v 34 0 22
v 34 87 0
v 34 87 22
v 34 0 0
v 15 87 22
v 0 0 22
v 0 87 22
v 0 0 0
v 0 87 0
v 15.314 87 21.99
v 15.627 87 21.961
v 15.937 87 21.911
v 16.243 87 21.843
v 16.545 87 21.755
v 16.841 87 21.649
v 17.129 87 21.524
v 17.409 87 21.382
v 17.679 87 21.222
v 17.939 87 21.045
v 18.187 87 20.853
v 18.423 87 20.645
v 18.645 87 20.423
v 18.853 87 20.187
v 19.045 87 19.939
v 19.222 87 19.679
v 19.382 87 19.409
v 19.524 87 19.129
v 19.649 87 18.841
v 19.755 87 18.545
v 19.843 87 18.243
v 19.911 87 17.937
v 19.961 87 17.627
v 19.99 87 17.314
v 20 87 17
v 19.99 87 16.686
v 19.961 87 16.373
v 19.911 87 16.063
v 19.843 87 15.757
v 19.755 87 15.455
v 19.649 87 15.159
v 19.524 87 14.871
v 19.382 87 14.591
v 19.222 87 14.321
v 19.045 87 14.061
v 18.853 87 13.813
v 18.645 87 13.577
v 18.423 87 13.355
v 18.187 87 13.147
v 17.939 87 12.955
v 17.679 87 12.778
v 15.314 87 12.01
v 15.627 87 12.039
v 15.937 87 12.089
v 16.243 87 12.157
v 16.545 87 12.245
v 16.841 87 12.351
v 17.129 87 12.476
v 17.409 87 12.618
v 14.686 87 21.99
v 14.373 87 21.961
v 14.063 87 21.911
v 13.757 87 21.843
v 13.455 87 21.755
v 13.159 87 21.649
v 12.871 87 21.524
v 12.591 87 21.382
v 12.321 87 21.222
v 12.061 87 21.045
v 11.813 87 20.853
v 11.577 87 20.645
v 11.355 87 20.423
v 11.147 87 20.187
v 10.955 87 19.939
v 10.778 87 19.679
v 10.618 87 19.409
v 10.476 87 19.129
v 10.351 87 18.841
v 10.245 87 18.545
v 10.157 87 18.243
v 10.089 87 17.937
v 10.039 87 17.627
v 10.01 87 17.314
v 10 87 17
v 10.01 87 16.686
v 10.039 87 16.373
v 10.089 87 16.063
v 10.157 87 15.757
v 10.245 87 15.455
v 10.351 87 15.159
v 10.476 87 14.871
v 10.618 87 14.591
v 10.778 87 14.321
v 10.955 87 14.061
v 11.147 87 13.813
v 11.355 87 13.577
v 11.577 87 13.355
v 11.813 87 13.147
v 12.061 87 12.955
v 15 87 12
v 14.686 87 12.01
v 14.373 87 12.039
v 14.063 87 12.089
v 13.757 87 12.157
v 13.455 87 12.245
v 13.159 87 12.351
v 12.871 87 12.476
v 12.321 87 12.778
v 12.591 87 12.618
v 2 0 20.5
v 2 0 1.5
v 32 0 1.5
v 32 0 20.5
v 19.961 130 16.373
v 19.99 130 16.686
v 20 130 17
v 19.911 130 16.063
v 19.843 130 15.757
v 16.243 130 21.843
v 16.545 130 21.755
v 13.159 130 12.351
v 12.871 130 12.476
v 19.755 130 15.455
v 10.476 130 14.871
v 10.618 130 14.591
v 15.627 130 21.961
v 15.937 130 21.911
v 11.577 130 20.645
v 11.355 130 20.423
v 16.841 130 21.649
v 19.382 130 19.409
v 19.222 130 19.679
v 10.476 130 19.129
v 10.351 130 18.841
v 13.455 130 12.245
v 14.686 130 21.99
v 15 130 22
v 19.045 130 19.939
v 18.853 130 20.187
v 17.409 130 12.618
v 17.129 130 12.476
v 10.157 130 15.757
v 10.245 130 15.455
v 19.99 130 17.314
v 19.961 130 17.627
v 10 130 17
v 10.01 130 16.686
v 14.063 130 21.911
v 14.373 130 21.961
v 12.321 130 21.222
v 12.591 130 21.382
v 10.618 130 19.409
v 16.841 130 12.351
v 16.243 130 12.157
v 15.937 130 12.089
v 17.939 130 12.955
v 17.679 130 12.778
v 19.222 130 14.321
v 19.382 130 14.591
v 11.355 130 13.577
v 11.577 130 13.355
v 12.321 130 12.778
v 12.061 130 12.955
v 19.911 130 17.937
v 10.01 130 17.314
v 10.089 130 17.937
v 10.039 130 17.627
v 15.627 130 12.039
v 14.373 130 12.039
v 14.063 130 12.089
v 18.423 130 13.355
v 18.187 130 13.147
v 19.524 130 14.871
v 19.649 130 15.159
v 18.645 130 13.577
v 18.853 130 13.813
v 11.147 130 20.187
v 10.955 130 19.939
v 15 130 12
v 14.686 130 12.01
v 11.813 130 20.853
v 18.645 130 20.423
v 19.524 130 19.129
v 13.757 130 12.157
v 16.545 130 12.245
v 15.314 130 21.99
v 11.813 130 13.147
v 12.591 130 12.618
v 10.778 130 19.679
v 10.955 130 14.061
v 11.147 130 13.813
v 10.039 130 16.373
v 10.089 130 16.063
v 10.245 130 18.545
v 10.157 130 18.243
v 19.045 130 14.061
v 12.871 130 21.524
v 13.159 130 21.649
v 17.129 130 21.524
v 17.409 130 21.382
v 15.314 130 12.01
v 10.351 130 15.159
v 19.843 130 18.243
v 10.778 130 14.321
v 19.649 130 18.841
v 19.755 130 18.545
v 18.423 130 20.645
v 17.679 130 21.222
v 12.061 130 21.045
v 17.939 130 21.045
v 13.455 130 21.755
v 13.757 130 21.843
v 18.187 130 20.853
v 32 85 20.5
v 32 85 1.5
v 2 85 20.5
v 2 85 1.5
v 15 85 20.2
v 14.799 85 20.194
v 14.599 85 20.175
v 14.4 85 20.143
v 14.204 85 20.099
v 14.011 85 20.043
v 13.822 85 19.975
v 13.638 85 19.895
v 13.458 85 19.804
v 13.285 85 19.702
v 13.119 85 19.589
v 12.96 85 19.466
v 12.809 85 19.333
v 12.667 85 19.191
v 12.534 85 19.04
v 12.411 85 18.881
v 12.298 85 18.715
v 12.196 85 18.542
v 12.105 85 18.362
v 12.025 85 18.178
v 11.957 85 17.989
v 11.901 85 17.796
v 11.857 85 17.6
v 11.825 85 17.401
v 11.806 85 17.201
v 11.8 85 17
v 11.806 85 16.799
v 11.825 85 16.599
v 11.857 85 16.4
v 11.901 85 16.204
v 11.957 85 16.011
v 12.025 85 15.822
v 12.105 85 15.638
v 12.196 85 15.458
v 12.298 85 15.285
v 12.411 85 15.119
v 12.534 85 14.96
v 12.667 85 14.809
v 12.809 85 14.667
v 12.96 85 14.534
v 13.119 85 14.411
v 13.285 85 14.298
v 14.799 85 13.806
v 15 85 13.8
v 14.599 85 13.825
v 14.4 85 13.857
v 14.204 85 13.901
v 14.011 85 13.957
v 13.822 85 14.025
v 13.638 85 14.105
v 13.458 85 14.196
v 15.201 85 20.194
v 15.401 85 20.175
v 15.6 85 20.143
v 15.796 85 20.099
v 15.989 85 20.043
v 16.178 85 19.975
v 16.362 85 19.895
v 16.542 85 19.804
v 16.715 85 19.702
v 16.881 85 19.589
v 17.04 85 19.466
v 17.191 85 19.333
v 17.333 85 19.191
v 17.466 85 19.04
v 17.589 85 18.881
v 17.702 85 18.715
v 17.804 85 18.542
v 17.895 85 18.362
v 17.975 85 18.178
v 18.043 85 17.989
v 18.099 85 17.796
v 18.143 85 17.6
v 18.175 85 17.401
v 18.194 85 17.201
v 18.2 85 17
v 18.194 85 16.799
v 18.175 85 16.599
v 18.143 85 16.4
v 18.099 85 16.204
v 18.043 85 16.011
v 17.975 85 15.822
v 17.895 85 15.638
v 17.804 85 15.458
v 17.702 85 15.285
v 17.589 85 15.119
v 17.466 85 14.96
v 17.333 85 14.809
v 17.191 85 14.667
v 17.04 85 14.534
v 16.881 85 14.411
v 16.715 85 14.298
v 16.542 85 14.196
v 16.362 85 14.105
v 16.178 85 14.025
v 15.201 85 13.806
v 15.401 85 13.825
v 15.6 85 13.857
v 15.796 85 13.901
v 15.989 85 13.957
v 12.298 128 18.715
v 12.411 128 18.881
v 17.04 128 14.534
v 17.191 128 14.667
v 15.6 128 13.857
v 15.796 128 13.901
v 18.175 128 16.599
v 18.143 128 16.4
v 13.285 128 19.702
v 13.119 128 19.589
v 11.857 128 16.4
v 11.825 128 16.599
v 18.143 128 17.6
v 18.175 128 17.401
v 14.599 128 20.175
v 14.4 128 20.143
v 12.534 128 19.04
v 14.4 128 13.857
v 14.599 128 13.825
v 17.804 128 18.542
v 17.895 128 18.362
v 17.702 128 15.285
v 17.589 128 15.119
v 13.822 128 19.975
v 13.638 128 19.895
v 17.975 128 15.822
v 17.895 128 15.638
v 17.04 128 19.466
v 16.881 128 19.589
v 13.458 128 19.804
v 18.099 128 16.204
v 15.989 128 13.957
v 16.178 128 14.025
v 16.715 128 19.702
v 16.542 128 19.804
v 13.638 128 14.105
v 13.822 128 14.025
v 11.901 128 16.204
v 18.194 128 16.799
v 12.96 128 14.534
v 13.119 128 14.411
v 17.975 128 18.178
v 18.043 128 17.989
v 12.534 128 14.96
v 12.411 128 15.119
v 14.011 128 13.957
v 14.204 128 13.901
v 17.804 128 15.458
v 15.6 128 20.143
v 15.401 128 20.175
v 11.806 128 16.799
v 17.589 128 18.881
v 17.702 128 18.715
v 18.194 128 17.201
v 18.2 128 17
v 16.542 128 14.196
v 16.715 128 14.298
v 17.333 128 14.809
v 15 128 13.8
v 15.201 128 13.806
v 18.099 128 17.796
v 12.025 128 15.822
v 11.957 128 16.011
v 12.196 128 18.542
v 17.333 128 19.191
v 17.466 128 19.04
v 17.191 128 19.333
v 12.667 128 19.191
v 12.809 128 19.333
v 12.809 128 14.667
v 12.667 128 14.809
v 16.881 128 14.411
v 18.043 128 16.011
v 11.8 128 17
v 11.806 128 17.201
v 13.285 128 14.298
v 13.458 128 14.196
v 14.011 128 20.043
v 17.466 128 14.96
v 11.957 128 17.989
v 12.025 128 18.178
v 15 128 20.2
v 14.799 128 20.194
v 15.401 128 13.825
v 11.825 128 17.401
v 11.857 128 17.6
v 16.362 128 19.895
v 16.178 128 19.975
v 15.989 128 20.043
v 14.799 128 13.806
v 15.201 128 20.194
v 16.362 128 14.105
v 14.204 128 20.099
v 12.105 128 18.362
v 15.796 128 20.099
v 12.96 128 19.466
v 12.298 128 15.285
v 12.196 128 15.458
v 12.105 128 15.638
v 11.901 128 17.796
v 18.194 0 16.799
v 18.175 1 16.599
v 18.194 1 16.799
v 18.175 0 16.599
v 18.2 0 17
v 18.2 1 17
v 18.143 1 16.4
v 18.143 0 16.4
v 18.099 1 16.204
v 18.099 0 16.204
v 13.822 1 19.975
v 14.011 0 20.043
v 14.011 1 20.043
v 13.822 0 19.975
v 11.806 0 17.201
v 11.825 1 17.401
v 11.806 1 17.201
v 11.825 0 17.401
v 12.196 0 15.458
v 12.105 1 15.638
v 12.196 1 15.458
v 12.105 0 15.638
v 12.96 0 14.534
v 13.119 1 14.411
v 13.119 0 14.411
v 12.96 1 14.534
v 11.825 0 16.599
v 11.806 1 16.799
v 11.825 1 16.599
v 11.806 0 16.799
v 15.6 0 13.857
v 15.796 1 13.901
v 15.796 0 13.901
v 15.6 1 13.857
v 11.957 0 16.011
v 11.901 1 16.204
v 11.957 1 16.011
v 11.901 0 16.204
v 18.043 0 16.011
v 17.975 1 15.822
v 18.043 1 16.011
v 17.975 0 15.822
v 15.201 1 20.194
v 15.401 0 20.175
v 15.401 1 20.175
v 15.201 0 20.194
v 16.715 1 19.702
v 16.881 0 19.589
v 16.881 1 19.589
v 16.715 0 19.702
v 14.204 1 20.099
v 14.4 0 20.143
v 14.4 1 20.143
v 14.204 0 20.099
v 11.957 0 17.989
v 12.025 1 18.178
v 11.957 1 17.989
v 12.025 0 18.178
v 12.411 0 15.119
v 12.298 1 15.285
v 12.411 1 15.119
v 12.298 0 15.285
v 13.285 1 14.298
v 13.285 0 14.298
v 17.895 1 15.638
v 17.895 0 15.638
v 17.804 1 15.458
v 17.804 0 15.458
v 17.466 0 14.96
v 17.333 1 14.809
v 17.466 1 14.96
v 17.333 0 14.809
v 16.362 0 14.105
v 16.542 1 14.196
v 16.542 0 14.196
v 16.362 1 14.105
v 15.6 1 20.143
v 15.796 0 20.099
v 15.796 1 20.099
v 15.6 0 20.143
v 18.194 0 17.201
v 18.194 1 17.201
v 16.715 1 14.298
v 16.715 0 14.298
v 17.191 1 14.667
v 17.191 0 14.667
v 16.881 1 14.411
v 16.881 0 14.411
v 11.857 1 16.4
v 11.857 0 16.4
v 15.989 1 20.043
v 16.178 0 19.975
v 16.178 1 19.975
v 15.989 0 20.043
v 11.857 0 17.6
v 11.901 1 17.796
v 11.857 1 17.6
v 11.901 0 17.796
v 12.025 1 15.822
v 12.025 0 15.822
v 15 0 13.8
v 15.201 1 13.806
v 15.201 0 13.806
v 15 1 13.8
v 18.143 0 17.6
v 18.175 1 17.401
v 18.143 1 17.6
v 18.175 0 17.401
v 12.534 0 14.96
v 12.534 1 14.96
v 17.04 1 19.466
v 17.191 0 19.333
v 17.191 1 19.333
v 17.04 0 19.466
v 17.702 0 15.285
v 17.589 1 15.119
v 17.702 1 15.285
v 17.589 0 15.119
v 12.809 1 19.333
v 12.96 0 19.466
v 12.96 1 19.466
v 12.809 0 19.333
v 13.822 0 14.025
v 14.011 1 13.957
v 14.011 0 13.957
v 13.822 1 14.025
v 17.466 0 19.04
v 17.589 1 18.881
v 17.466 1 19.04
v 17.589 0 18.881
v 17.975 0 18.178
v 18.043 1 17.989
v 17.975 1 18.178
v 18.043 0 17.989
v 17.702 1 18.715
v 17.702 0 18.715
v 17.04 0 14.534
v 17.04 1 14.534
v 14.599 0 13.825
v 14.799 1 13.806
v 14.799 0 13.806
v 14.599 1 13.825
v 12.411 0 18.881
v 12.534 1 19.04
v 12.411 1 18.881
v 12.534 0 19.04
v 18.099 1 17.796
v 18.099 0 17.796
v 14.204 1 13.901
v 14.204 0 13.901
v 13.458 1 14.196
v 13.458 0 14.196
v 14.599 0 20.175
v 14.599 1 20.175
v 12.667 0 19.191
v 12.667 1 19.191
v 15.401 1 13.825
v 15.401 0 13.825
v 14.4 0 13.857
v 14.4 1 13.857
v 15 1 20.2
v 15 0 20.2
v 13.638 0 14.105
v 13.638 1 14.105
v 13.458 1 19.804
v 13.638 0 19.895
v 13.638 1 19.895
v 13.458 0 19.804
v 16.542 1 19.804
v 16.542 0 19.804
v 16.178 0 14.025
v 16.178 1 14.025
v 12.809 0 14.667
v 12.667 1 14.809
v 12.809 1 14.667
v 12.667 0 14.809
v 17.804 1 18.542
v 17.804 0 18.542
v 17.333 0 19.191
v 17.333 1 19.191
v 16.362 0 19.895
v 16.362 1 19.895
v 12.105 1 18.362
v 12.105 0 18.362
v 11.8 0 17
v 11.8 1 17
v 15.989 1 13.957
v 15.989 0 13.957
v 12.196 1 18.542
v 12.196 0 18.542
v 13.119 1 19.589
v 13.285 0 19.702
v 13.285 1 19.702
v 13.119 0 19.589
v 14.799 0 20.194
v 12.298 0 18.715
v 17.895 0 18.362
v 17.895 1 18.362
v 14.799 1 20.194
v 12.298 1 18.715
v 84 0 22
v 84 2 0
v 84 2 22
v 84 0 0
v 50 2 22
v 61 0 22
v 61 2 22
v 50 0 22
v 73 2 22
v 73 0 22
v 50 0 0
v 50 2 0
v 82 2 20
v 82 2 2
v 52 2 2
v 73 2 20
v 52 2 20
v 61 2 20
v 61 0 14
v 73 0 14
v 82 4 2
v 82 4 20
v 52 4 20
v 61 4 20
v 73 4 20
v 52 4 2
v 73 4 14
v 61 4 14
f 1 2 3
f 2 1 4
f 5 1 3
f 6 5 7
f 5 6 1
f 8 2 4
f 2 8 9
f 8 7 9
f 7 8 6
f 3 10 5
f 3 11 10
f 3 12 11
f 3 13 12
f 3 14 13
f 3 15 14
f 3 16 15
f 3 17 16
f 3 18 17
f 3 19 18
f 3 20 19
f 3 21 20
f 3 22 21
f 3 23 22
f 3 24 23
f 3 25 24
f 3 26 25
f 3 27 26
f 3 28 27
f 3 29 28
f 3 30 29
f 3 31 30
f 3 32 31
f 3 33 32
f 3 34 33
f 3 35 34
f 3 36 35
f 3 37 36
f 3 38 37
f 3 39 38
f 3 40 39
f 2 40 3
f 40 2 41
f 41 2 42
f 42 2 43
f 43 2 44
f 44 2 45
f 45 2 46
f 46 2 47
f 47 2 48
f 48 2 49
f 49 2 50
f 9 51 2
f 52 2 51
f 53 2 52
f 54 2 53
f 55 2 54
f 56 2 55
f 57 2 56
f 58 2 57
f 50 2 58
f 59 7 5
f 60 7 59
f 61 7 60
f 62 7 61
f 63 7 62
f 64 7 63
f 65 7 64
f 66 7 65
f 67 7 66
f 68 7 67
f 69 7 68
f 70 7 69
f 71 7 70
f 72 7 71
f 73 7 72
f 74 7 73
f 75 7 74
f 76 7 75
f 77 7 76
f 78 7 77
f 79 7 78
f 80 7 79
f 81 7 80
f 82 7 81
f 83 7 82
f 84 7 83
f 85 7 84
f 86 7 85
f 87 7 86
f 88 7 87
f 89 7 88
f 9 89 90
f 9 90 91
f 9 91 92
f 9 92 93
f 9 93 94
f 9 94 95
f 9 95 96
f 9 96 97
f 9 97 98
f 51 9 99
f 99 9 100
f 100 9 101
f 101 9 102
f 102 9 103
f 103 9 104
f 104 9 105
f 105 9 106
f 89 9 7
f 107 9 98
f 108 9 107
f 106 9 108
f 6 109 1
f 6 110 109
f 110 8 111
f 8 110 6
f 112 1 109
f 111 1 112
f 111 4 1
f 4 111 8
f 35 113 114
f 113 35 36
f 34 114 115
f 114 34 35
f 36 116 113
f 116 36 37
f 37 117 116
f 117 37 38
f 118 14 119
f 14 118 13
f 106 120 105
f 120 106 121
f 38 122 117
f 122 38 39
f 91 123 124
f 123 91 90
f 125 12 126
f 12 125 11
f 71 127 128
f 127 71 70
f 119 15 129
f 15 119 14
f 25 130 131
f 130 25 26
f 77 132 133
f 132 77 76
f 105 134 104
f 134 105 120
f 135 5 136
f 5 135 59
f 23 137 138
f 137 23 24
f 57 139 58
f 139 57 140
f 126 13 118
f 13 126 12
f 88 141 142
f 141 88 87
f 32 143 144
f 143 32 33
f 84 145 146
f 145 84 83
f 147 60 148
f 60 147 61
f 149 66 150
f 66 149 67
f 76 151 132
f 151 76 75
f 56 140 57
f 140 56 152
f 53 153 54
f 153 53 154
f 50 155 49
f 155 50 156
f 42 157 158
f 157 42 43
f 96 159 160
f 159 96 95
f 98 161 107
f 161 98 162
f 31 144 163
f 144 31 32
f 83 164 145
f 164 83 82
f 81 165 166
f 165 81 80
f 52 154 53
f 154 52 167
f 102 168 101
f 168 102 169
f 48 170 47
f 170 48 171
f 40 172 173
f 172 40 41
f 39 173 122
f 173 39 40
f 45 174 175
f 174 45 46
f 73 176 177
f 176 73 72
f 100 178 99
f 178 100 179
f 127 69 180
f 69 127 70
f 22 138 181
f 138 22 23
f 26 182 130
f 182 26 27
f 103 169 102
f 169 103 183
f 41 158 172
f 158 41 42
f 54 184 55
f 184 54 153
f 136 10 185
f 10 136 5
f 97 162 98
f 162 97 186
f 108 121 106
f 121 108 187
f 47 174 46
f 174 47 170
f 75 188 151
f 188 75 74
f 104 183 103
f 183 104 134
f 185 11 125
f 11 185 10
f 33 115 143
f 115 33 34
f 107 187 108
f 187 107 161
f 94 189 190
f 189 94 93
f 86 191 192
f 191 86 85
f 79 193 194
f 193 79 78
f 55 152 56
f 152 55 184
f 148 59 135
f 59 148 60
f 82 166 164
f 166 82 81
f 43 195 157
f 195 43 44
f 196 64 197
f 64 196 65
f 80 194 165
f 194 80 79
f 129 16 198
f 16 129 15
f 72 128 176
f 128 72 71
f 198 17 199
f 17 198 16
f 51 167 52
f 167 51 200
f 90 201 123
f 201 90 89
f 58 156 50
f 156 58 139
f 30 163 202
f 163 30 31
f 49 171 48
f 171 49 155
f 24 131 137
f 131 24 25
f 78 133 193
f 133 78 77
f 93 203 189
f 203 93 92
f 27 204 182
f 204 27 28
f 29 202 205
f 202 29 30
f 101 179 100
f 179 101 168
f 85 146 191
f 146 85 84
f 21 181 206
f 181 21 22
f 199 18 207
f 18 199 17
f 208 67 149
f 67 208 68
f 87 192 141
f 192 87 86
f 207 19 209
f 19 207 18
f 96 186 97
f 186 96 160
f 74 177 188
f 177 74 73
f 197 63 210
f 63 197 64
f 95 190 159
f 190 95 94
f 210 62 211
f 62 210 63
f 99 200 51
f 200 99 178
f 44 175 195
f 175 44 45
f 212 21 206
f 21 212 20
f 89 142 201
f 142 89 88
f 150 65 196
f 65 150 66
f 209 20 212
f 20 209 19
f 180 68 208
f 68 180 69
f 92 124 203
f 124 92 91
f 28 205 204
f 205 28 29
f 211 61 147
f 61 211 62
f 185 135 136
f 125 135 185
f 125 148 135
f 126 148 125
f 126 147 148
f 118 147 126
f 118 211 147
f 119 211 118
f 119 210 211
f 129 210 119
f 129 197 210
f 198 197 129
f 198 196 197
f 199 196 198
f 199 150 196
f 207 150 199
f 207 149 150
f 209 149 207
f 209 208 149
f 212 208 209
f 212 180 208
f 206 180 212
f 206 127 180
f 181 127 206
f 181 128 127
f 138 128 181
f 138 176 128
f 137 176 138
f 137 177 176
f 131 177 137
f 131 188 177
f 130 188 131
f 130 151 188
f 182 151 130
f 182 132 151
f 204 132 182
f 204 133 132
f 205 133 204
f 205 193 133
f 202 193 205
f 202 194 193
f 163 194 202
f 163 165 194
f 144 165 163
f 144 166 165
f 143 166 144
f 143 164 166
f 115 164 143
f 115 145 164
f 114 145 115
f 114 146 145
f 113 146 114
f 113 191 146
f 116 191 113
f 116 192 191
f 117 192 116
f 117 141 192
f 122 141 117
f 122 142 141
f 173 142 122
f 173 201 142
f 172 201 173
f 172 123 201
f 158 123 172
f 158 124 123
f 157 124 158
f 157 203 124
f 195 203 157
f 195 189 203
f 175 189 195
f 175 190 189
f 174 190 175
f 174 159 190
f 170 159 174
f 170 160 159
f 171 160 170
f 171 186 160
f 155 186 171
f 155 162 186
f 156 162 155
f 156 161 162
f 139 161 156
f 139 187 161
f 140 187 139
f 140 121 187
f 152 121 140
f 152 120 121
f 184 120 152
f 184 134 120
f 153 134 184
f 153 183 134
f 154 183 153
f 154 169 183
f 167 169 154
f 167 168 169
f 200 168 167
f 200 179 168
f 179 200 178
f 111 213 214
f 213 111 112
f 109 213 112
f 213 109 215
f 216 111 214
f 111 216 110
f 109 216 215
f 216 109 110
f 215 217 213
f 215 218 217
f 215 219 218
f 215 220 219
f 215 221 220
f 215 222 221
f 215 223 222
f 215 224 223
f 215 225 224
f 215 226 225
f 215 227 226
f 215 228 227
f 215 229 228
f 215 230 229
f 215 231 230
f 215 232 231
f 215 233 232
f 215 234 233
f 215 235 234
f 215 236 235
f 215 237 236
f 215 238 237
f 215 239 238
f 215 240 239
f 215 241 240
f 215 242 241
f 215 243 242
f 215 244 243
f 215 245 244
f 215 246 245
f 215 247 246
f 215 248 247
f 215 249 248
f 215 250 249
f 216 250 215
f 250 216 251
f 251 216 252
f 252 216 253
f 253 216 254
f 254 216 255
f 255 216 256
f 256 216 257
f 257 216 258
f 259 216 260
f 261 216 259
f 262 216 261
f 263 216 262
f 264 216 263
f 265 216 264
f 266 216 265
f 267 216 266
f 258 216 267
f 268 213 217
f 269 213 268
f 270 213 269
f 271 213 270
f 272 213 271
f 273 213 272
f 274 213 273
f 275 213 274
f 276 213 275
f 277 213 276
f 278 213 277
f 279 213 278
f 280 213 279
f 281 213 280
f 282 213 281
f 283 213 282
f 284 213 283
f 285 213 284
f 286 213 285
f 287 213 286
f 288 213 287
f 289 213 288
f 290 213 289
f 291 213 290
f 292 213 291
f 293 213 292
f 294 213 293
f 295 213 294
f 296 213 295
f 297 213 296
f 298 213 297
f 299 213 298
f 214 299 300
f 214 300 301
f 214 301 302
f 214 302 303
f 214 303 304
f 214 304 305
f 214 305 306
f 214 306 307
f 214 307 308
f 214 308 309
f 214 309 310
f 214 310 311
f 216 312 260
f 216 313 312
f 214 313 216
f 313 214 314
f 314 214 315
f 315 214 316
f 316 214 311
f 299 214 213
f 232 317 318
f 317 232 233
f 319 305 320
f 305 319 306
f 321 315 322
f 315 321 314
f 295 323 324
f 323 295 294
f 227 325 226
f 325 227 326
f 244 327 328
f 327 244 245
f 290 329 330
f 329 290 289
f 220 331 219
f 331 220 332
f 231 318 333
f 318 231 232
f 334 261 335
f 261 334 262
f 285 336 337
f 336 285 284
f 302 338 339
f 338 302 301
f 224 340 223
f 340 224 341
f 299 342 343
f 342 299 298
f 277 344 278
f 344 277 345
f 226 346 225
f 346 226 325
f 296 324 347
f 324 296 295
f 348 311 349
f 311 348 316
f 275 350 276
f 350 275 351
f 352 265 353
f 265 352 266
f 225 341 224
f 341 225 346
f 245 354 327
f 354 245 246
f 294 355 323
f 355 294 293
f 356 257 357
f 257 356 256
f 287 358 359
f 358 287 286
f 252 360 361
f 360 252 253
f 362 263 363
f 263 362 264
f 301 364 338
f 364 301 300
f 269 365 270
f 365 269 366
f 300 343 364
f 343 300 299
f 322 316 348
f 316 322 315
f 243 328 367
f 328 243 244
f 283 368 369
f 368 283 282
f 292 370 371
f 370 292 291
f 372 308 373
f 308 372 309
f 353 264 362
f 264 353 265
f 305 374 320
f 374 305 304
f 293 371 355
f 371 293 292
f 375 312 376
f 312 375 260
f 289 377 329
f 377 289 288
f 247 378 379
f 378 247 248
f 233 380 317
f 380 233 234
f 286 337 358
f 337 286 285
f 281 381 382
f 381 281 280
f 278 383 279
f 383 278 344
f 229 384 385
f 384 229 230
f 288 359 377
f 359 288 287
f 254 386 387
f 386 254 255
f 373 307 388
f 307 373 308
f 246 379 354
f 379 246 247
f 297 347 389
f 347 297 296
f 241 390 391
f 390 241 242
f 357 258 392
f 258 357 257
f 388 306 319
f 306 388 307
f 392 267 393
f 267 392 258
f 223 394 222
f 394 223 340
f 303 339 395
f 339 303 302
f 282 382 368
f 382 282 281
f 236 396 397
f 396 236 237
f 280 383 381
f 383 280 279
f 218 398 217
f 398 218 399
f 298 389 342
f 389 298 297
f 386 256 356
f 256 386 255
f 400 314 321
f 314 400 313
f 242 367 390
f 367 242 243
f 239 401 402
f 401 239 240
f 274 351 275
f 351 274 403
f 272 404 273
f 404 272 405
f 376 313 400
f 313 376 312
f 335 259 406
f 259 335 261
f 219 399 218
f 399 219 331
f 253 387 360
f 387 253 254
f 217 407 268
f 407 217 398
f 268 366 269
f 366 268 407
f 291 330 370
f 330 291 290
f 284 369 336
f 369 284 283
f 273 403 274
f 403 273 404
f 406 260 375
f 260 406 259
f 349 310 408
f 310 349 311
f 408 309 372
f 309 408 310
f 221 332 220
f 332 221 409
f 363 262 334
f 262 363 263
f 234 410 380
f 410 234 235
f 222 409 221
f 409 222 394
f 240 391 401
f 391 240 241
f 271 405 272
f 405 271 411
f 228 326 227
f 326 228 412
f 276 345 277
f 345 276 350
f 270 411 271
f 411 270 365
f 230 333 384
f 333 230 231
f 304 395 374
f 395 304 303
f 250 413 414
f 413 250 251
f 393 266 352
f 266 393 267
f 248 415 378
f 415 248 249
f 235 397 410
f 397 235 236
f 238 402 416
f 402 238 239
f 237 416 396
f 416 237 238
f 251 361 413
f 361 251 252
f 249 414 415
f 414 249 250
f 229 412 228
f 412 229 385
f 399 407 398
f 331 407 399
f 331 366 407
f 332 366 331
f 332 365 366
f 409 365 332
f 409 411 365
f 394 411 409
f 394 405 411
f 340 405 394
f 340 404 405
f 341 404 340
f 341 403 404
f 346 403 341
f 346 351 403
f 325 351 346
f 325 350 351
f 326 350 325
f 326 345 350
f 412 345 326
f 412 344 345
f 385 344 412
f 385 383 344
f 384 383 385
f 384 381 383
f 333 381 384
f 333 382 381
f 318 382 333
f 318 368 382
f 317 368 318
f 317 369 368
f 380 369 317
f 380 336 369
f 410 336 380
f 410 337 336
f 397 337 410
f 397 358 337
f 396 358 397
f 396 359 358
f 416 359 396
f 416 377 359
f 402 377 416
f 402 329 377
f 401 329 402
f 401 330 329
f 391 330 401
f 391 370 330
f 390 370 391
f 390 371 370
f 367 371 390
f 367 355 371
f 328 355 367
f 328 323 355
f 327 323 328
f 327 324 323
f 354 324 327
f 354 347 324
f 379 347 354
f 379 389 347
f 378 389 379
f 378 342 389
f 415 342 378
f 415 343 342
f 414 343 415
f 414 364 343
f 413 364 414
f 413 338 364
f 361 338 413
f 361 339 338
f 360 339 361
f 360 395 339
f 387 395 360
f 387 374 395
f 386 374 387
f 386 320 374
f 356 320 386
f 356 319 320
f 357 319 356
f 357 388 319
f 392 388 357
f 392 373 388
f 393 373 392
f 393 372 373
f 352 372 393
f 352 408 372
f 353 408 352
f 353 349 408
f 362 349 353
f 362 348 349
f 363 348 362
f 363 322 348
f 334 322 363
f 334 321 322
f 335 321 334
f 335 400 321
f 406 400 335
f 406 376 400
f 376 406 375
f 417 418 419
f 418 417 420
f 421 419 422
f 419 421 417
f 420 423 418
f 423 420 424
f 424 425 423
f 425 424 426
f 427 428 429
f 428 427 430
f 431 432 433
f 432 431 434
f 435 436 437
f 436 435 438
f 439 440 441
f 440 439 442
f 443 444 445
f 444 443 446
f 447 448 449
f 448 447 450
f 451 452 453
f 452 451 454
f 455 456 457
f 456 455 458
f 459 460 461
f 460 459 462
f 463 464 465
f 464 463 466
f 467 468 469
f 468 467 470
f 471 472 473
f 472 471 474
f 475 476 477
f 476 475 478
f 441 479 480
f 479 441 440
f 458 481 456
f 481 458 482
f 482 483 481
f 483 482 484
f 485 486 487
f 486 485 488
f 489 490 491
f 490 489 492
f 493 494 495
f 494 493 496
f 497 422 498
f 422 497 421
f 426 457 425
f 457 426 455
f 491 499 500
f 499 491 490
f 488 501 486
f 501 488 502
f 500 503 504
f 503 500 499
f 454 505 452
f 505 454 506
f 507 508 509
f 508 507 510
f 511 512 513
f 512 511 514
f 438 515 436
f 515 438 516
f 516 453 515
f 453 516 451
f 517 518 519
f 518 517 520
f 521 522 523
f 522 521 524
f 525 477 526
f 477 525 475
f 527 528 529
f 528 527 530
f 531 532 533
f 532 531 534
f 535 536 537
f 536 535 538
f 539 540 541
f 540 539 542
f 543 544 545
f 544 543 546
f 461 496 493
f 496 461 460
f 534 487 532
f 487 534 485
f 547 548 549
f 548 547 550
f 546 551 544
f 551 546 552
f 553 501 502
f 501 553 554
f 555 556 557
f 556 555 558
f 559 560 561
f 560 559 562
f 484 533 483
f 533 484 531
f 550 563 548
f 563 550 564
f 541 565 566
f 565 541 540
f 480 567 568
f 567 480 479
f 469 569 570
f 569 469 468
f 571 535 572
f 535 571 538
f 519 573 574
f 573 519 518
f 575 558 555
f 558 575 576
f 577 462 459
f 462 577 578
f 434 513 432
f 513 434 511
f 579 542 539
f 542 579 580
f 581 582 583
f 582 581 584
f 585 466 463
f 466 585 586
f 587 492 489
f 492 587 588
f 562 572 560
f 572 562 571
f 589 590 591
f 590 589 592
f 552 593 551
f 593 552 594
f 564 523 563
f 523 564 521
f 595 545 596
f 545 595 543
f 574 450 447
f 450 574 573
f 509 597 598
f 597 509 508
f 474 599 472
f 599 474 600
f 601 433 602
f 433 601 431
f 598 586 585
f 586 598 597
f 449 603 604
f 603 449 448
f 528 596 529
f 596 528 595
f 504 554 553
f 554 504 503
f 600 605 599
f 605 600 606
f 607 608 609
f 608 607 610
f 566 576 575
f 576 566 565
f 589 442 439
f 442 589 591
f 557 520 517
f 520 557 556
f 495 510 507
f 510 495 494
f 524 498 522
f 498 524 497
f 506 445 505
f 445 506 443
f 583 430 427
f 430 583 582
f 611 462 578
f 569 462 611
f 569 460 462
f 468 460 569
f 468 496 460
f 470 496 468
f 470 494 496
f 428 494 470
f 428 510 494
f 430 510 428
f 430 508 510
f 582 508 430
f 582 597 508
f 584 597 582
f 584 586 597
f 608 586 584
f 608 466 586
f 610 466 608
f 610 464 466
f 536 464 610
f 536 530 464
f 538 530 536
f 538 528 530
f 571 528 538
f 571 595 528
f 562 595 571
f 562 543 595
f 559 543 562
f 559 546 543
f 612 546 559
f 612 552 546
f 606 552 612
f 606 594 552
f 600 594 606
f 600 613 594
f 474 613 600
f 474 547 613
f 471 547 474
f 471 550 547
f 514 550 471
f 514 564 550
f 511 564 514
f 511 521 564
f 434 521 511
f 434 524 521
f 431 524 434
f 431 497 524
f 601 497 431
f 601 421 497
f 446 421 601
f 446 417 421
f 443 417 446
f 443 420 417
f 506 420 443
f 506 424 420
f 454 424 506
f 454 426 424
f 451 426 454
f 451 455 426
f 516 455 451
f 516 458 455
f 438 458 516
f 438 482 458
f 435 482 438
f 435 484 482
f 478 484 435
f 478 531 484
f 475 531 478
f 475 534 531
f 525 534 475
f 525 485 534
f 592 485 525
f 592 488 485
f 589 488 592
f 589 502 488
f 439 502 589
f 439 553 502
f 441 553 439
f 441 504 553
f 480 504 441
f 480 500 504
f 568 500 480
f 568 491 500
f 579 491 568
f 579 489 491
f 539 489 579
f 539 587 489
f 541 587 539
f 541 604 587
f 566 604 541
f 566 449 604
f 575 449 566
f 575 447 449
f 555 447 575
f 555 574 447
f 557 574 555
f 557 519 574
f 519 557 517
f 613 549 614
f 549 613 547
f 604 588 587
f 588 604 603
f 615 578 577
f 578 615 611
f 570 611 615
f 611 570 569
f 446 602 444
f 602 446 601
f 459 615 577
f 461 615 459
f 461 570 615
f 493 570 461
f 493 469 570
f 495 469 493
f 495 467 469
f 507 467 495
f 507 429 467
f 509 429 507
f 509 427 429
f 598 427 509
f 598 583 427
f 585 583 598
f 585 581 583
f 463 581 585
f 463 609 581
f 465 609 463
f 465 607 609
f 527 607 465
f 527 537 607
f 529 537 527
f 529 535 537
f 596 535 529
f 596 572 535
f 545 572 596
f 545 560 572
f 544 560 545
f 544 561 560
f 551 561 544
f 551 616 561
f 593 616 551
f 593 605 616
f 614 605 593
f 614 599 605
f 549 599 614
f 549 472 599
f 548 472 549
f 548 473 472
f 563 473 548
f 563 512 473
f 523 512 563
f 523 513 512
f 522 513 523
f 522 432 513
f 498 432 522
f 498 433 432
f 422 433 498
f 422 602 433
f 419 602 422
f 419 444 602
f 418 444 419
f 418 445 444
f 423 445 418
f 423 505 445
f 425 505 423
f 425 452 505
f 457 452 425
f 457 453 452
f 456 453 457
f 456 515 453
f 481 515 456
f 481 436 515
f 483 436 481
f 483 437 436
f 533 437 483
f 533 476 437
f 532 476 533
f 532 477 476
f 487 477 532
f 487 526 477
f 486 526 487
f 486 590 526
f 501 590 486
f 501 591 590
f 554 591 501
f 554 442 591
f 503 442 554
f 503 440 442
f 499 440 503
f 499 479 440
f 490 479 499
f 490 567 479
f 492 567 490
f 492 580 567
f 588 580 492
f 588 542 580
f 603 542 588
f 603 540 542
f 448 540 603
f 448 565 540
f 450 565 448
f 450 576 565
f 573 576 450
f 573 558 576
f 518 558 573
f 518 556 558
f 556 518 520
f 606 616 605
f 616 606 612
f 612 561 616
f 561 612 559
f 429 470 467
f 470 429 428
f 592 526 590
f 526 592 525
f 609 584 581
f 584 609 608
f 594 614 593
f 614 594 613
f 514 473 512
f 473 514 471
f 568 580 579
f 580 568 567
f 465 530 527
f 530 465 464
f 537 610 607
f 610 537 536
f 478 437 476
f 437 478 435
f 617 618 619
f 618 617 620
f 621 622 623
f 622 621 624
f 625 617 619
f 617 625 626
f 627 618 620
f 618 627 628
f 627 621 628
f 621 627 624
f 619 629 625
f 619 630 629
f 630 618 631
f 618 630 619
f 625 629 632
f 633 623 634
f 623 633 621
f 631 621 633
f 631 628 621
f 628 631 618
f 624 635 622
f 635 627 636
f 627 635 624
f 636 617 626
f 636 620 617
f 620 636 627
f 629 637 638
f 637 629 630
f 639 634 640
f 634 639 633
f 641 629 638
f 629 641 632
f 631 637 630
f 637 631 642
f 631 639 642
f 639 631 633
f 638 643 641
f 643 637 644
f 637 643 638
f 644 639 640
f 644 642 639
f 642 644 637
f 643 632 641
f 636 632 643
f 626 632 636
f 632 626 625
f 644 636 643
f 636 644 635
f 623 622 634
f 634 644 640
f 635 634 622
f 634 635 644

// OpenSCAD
/**
 * This is a casing for a prototype of the LoRa-MeshDevice
 */


union(){
    translate([0, 2, 0]) difference(){
        union(){
            translate([0, -2, 0]) cube([34, 87, 22]);
            rotate([-90, 0, 0]) translate([13+2, -15-2, 83]) cylinder(45, 5, 5, $fn = 100);
        }
        translate([2, -2, 1.5]) cube([30, 85, 19]);
        rotate([-90, 0, 0]) translate([13+2, -15-2, 83]) cylinder(43, 3.2, 3.2, $fn = 100);
    }
    rotate([-90, 0, 0]) translate([13+2, -15-2, 0]) cylinder(1, 3.2, 3.2, $fn = 100);
}

difference(){
    translate([50, 0, 0]) union(){
        cube([34, 2, 22]);
        translate([2, 2, 2]) cube([30, 2, 18]);
    }
    translate([59 + 2, 0, 12.5 + 1.5]) cube([12, 4, 8]);
}
